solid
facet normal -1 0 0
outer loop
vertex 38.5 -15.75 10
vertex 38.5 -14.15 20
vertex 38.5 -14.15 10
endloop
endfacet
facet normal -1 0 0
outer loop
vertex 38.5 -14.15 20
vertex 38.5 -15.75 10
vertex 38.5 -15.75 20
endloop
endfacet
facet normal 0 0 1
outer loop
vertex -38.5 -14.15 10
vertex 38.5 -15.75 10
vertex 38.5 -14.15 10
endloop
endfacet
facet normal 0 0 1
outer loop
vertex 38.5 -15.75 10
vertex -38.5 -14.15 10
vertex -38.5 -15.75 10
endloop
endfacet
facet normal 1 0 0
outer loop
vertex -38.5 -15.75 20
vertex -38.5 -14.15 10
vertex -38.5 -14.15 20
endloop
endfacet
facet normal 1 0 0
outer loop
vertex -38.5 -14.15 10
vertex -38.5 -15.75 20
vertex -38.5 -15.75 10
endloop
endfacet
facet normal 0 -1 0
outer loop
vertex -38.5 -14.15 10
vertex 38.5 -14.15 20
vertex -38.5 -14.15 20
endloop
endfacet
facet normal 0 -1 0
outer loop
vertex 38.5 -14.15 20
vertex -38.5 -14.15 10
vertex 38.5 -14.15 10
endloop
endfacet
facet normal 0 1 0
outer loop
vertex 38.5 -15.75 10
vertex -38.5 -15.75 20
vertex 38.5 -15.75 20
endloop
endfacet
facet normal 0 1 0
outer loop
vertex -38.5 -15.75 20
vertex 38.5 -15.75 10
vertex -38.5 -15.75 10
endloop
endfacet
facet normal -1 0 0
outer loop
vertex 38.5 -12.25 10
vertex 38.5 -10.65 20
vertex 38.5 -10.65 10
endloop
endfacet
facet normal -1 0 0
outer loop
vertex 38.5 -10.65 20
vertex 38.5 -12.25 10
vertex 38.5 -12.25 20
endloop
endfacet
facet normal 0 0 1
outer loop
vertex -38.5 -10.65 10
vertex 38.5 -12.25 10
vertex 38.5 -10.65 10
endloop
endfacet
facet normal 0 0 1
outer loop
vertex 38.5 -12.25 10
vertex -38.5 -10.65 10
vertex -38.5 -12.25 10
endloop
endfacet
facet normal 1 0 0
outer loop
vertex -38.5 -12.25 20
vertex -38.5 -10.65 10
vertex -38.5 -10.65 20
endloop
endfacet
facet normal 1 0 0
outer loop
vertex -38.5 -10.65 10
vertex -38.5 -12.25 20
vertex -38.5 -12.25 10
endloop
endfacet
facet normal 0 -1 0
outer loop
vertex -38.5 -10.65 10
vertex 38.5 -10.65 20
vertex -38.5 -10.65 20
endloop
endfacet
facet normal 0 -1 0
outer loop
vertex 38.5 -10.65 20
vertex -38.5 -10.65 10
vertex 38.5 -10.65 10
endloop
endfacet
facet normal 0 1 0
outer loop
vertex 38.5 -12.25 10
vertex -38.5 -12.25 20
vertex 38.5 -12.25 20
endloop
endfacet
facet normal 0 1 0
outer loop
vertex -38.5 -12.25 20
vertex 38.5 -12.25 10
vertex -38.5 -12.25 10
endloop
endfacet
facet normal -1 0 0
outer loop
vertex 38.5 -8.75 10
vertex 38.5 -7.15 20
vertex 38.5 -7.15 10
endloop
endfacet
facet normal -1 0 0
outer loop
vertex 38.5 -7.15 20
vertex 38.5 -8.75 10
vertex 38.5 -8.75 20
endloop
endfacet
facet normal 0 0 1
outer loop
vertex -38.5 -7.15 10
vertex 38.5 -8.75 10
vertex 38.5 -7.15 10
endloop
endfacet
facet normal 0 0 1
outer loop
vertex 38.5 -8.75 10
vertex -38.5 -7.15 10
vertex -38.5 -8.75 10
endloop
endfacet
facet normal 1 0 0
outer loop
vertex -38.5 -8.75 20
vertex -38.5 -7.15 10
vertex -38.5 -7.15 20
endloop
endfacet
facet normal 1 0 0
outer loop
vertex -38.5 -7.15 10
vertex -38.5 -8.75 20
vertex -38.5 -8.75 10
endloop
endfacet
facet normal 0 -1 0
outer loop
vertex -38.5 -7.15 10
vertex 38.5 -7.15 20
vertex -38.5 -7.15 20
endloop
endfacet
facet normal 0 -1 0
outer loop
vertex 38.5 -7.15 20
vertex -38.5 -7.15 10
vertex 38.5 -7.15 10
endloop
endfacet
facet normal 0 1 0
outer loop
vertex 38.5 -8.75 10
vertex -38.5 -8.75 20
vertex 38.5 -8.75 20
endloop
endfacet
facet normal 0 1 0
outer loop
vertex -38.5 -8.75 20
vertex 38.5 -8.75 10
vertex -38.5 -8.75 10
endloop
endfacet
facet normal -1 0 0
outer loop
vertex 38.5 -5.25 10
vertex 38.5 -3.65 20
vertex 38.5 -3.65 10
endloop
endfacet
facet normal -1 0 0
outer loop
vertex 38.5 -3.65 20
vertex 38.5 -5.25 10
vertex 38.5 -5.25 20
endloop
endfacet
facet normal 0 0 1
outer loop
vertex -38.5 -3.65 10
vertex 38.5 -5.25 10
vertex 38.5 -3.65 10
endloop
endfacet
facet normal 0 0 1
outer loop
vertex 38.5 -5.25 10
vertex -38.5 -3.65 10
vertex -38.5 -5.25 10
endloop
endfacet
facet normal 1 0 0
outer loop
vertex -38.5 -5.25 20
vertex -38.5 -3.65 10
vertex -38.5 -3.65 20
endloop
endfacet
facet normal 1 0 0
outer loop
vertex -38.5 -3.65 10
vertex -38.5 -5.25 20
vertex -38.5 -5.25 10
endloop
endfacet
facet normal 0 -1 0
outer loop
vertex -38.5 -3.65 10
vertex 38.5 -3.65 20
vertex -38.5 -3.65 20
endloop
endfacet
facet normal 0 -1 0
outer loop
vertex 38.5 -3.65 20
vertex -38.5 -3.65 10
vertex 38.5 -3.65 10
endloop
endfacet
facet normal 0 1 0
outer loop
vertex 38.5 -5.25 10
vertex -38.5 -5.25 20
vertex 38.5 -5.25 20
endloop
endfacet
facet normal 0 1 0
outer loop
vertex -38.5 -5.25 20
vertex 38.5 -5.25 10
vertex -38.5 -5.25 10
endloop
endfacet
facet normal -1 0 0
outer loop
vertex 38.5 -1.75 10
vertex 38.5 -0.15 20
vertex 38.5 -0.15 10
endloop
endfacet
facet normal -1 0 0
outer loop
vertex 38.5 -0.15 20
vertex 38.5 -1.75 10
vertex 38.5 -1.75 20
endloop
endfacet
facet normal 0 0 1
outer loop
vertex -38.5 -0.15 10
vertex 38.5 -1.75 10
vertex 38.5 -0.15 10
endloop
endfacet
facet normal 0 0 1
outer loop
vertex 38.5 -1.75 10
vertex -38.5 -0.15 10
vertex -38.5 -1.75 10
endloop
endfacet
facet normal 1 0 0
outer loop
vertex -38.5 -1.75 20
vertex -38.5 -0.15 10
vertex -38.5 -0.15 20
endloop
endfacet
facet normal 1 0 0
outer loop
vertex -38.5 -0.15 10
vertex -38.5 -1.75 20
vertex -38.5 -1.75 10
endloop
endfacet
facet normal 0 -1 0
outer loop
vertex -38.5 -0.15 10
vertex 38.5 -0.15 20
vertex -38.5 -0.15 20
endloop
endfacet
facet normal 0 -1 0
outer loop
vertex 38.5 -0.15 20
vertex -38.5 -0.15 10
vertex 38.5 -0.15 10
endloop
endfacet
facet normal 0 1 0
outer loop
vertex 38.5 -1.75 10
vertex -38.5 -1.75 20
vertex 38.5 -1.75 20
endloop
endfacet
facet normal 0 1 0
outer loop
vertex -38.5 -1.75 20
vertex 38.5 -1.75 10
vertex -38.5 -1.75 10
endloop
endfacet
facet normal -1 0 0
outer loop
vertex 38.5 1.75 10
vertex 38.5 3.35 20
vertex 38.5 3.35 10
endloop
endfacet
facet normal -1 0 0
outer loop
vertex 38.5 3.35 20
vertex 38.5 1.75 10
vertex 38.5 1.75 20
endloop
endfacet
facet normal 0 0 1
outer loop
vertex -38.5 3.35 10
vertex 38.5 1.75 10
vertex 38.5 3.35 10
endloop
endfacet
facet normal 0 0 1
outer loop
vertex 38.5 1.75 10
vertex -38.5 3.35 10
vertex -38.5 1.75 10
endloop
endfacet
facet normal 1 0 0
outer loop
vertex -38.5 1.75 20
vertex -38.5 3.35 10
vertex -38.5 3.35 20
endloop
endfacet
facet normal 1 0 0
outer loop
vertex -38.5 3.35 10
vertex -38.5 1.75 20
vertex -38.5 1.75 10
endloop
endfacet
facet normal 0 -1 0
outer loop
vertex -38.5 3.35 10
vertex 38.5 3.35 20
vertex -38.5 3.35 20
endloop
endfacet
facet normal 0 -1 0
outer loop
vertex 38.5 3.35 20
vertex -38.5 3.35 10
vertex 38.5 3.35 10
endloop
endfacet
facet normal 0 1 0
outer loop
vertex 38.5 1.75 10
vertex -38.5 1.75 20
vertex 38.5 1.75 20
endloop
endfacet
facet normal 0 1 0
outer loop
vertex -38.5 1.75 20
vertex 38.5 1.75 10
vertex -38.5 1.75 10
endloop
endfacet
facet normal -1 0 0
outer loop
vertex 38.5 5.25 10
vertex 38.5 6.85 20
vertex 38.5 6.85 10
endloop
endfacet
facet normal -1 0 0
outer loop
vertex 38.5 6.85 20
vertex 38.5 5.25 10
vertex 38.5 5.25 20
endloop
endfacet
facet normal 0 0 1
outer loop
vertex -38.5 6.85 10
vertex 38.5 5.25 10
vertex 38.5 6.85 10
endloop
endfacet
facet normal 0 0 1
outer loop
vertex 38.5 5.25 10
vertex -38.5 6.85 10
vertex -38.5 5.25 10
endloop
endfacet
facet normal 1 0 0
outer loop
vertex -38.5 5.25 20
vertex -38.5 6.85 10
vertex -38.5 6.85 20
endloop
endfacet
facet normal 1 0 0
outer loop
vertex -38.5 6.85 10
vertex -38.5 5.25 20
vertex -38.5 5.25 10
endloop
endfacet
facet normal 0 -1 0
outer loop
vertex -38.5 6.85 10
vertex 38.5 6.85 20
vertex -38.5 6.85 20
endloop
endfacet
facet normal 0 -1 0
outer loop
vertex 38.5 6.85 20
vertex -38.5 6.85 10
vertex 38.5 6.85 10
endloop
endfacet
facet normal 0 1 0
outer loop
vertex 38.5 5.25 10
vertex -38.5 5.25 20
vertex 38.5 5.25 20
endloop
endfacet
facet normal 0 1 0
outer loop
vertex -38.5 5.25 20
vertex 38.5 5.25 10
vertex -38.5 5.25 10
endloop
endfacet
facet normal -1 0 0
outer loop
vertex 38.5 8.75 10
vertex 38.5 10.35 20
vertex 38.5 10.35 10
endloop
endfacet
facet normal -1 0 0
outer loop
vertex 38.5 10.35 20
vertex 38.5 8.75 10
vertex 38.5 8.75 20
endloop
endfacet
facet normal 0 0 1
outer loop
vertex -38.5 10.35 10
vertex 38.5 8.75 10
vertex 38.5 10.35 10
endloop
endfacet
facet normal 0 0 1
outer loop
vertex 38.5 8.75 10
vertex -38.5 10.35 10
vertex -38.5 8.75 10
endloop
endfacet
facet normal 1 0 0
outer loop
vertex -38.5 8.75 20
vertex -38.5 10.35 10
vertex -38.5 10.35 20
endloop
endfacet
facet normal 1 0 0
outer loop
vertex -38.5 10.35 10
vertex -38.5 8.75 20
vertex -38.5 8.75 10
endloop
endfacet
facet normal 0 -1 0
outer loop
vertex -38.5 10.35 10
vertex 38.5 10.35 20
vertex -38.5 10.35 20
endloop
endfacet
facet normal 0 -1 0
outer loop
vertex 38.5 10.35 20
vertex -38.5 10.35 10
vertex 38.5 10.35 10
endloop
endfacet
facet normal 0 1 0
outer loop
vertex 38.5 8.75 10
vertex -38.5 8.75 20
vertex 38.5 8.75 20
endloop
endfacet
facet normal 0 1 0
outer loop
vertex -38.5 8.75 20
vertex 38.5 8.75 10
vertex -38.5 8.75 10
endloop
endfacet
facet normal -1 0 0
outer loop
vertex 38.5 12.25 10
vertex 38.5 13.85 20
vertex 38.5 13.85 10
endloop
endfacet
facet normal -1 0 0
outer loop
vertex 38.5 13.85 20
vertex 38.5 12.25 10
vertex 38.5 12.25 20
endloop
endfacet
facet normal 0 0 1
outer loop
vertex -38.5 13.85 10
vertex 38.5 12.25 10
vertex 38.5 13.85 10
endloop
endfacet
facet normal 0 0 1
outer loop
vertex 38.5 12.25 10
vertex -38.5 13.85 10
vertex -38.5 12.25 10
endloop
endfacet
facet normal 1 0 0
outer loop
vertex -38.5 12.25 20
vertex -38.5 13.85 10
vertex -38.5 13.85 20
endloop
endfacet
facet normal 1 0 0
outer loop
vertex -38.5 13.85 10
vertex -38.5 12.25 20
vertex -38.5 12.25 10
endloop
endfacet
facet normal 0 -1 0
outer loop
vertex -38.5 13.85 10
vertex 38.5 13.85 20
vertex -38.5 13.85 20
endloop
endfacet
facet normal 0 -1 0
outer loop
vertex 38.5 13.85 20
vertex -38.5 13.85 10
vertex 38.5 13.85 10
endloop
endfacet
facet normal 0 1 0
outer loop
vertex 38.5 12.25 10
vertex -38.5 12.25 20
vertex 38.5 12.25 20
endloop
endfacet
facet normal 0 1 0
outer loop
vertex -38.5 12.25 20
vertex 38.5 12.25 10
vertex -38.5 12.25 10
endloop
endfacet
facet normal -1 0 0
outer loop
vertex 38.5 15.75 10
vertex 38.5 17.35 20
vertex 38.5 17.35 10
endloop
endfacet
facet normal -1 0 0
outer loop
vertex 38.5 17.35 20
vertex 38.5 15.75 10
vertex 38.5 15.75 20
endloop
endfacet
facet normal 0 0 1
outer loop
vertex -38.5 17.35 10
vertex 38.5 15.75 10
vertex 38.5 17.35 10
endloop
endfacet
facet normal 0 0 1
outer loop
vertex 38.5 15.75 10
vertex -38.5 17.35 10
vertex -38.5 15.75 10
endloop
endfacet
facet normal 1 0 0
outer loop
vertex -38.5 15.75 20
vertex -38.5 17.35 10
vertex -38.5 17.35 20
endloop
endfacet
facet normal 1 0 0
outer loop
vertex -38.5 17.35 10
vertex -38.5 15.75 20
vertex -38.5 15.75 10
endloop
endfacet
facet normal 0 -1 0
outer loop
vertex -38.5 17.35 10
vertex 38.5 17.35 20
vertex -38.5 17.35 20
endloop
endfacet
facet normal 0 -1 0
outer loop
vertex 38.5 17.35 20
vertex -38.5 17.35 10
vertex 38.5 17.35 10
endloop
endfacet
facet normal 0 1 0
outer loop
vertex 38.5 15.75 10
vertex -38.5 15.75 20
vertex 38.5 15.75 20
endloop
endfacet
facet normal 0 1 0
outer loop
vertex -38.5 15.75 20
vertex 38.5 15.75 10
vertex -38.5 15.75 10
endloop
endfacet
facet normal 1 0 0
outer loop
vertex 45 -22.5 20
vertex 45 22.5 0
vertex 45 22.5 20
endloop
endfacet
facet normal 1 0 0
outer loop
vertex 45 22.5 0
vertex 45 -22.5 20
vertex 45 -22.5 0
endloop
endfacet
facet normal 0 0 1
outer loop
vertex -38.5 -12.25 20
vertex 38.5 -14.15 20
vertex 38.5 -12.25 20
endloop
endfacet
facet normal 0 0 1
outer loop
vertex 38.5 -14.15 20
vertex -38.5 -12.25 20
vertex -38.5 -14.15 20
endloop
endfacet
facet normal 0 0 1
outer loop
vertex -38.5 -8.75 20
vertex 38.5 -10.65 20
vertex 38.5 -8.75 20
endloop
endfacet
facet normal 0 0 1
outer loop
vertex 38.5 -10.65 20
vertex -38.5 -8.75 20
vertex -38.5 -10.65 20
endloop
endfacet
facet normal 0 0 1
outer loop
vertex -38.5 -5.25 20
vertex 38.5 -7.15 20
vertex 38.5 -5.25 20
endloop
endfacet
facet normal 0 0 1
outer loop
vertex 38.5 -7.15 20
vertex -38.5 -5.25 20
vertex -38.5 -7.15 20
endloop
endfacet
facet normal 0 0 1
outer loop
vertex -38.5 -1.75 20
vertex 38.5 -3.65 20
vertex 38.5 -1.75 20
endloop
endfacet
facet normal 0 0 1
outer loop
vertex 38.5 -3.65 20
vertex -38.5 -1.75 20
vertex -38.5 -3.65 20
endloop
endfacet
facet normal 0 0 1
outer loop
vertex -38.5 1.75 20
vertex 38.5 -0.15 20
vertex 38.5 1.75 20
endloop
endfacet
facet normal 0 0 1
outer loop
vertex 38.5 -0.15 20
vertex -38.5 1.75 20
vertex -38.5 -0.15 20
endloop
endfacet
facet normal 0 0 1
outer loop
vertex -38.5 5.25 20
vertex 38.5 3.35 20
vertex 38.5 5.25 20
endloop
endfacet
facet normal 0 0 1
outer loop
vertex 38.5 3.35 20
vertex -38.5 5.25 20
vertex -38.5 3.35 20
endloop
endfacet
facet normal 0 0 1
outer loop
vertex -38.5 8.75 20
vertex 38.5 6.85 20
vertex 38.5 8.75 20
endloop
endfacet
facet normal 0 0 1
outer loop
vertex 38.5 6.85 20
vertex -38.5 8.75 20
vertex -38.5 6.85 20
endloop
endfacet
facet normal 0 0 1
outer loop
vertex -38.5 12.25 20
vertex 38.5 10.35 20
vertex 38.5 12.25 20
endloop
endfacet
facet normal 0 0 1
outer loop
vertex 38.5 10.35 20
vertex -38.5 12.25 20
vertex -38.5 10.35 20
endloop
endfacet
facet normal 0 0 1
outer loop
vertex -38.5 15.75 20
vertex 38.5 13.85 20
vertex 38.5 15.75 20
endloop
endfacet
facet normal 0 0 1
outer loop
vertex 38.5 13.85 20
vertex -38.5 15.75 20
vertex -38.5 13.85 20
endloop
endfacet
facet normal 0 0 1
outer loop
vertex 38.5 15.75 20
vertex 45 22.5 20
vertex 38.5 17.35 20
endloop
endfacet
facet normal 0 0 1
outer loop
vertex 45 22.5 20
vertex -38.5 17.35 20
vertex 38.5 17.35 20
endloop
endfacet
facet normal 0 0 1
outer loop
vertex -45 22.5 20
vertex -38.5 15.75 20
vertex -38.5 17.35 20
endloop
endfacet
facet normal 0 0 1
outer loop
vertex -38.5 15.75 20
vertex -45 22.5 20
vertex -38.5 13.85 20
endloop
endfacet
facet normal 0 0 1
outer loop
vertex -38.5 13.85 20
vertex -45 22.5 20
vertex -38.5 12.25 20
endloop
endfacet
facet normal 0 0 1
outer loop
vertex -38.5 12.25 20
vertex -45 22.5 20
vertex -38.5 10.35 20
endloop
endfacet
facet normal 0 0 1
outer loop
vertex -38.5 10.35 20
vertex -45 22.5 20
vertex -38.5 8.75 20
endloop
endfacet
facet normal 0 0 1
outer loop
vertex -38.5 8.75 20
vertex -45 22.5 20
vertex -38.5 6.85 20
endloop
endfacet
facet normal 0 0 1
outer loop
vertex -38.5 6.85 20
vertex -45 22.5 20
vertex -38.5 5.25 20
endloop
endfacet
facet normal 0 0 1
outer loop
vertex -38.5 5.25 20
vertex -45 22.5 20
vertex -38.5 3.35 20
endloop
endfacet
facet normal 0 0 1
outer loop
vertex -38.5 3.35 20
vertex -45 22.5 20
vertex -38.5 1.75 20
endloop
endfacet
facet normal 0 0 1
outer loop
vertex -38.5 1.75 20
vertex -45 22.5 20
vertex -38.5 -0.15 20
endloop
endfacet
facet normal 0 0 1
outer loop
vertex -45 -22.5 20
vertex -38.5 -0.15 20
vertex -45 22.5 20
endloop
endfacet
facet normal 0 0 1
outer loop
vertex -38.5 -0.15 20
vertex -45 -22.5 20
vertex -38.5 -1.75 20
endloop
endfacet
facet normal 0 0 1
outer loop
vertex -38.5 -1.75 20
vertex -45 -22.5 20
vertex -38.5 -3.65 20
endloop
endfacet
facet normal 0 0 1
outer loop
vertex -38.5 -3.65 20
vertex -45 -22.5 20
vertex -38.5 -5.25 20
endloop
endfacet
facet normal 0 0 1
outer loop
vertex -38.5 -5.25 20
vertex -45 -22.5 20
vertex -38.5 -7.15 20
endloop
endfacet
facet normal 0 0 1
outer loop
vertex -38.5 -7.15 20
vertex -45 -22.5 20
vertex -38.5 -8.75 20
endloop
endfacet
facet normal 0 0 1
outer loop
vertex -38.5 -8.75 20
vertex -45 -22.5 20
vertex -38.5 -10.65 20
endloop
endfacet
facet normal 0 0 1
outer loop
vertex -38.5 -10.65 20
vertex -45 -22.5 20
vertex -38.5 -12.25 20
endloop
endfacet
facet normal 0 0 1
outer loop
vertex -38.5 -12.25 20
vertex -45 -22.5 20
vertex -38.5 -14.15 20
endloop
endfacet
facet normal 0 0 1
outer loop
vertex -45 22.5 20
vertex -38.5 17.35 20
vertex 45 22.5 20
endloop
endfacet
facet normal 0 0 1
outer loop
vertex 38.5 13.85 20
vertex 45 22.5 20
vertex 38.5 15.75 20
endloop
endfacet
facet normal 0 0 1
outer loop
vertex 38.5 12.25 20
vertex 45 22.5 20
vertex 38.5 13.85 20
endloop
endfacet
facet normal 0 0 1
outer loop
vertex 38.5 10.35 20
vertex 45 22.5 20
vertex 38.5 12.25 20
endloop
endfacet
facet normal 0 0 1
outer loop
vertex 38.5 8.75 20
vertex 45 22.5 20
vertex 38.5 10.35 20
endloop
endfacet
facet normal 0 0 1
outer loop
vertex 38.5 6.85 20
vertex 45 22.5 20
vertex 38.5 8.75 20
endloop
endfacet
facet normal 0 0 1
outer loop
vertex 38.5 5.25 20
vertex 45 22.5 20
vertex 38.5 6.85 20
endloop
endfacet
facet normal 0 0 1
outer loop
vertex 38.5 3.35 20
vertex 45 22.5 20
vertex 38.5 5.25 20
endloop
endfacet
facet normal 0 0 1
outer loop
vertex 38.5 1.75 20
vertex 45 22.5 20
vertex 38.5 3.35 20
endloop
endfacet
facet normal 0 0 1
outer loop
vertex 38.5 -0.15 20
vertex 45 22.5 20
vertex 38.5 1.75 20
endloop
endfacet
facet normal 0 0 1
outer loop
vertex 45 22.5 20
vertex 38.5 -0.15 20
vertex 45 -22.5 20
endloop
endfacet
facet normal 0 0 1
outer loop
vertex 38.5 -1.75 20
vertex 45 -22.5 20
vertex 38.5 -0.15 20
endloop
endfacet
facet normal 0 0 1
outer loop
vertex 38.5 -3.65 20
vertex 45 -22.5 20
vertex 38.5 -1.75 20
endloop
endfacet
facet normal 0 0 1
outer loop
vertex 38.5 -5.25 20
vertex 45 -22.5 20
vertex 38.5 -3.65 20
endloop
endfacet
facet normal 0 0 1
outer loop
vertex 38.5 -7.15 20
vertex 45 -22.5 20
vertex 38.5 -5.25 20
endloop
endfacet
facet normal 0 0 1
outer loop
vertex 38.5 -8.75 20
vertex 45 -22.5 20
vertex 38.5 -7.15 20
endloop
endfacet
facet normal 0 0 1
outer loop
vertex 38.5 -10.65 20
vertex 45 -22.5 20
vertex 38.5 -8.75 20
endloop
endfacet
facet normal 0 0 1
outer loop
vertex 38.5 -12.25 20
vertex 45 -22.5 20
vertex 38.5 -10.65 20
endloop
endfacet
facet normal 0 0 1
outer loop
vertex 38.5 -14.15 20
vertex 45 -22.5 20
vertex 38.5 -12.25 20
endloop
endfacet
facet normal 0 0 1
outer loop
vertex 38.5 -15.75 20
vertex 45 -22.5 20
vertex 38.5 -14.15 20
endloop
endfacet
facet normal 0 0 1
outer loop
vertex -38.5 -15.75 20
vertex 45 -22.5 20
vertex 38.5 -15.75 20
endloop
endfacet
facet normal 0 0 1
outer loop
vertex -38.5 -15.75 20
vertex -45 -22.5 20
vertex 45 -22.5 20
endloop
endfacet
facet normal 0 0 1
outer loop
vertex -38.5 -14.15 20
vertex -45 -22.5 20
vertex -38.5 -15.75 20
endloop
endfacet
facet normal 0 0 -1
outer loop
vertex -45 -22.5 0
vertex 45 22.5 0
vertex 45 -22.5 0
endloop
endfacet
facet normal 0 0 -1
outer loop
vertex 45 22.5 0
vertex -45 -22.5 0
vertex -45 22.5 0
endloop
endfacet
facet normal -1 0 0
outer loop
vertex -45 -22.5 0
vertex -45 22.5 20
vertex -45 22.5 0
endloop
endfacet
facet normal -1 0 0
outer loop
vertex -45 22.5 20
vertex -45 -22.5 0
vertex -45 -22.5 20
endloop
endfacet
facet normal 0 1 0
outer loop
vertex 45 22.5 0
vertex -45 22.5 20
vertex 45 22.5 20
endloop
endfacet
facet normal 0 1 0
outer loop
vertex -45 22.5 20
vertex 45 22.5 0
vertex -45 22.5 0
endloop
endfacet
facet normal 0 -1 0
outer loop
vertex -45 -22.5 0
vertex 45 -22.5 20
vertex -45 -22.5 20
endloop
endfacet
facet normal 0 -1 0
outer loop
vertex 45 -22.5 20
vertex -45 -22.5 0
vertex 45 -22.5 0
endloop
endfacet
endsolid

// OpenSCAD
// Microscope slide drying rack
// Print orientation: base block on the bed (z = 0), slots open upward.

// ---------------- Parameters ----------------
block_len    = 90;    // block length along X (mm)
block_wid    = 45;    // block width along Y (mm)
block_h      = 20;    // block height along Z (mm)

slot_len     = 77;    // slot length along X (mm)
slot_w       = 1.6;   // slot width along Y (mm)
slot_depth   = 10;    // slot depth from top face (mm)
slot_count   = 10;    // number of slots
slot_pitch   = 3.5;   // centre-to-centre slot spacing in Y (mm)

eps          = 0.5;   // overshoot of cutters past the top face (mm)

$fn = 64;

// ---------------- Model ----------------
difference() {
    // Base block, centred in X and Y, resting on z = 0
    translate([-block_len/2, -block_wid/2, 0])
        cube([block_len, block_wid, block_h]);

    // Slot group, centred on the block in X and Y
    for (i = [0 : slot_count - 1]) {
        y = (i - (slot_count - 1)/2) * slot_pitch;
        translate([-slot_len/2, y, block_h - slot_depth])
            cube([slot_len, slot_w, slot_depth + eps]);
    }
}
